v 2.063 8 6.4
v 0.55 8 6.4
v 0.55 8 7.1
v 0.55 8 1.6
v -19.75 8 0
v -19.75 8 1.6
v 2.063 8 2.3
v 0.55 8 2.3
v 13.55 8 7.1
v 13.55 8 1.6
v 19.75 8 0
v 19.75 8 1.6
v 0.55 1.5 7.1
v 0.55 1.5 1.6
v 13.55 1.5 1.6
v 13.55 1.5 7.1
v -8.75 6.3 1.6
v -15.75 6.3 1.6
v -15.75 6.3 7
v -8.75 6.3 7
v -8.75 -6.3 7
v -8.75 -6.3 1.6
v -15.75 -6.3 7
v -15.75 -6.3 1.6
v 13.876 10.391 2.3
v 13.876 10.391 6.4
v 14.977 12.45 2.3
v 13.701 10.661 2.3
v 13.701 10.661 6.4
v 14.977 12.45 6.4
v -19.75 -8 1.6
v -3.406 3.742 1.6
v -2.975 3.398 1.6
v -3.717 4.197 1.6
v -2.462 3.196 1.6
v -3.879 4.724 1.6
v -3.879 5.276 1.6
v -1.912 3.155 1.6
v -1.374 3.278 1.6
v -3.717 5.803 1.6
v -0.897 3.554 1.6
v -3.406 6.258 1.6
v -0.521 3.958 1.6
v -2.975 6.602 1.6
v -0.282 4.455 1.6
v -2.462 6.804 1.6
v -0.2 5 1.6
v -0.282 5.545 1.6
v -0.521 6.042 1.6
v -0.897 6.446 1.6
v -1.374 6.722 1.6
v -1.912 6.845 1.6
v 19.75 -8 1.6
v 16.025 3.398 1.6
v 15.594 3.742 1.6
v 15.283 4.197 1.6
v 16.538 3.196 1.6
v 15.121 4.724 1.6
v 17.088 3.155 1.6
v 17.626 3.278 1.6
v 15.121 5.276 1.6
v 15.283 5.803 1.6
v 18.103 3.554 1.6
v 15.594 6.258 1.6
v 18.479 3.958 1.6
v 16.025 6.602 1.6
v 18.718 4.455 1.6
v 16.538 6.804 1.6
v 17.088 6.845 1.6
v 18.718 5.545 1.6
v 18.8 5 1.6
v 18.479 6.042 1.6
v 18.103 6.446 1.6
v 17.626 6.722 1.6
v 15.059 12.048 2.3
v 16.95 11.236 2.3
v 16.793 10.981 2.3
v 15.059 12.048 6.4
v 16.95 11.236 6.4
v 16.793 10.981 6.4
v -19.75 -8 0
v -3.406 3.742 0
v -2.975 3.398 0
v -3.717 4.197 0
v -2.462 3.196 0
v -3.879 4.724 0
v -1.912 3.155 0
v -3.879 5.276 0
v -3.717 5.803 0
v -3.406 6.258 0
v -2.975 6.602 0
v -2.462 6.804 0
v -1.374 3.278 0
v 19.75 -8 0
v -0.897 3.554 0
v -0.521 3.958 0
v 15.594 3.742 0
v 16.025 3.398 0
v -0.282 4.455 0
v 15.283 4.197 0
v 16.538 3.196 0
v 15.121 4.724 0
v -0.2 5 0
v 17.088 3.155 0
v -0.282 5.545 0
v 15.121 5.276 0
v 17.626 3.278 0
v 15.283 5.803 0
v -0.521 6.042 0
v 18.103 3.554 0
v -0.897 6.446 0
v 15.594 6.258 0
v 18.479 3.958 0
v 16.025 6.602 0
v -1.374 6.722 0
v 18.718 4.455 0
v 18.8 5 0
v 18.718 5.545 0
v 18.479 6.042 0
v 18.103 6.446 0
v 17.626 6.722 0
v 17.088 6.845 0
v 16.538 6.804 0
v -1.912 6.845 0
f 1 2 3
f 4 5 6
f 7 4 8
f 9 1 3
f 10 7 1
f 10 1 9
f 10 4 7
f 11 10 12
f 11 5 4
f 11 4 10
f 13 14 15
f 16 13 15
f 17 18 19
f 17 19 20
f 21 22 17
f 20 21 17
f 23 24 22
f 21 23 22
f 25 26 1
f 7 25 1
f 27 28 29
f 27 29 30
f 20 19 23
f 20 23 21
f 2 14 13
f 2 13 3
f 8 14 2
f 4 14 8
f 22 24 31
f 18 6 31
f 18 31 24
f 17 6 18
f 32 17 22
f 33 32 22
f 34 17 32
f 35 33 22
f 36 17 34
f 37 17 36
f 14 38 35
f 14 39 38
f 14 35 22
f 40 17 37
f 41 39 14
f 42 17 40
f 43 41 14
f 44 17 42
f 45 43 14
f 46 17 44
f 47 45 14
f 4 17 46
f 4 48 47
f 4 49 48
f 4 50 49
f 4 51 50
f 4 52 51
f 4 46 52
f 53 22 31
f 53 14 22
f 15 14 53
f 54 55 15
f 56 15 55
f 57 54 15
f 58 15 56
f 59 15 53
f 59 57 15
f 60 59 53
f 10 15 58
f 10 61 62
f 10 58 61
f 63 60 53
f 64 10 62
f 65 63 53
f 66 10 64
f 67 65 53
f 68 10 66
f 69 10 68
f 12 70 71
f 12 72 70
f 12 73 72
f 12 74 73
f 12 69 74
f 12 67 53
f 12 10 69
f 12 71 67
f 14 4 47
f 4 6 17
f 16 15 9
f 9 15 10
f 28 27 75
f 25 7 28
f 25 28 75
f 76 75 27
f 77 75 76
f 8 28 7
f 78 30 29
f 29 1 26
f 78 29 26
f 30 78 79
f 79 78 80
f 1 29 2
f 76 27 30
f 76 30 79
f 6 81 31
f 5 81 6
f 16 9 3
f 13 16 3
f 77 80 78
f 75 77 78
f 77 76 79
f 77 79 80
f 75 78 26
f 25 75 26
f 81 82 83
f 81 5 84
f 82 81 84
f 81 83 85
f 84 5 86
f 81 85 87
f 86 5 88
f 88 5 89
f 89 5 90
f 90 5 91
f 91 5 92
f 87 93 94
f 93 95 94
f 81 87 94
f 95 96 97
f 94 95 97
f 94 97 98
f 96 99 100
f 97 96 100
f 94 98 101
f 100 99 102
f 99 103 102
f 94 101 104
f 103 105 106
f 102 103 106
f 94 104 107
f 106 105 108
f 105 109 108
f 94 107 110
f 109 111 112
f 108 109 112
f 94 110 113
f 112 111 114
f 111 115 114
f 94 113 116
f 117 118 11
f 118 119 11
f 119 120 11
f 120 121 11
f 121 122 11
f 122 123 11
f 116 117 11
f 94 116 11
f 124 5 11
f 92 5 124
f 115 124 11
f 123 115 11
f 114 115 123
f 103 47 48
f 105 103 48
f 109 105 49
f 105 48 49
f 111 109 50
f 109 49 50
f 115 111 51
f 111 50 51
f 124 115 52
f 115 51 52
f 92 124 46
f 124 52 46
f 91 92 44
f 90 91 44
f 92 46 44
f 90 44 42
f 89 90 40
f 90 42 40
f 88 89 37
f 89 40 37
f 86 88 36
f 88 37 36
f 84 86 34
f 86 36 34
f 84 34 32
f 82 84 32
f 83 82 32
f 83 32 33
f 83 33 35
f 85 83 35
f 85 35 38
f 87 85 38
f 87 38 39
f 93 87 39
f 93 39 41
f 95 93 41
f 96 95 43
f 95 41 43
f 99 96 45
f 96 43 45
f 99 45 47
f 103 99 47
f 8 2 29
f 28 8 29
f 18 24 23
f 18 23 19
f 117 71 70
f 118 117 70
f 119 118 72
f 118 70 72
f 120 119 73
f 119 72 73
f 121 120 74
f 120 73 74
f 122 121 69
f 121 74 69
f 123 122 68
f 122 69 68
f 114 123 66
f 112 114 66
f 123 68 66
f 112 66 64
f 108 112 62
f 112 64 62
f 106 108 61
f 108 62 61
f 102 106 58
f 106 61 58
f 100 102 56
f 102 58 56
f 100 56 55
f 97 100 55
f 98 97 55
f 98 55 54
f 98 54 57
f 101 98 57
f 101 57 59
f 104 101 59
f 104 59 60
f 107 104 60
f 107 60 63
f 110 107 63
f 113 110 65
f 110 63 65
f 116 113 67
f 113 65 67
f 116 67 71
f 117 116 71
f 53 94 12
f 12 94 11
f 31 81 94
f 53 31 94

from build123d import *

# Parameters (mm, degrees)
SKETCH1_W           = 39.5
SKETCH1_H           = 16
BOSS_EXTRUDE1_DEPTH = 1.6
SKETCH2_R           = 1.85
CUT_EXTRUDE1_DEPTH  = 1.6
SKETCH3_W           = 13
SKETCH3_H           = 6.5
BOSS_EXTRUDE2_DEPTH = 5.5
BOSS_EXTRUDE3_DEPTH = 5.5
SKETCH5_W           = 19.265102418
SKETCH5_H           = 0.7
CUT_EXTRUDE2_DEPTH  = 14.5
SKETCH6_W           = 7
SKETCH6_H           = 12.6
BOSS_EXTRUDE4_DEPTH = 5.4


with BuildPart() as part:
    # Sketch1 → Boss-Extrude1 (new body)
    with BuildSketch(Plane.XY):
        Rectangle(SKETCH1_W, SKETCH1_H)
    extrude(amount=BOSS_EXTRUDE1_DEPTH)

    # Sketch2 → Cut-Extrude1 (cut)
    with BuildSketch(Plane.XY.offset(1.6)):
        with Locations((16.95, 5)):
            Circle(SKETCH2_R)
        with Locations((-2.05, 5)):
            Circle(SKETCH2_R)
    extrude(amount=-CUT_EXTRUDE1_DEPTH, mode=Mode.SUBTRACT)

    # Sketch3 → Boss-Extrude2 (add)
    with BuildSketch(Plane.XY.offset(1.6)):
        with Locations((7.05, 4.75)):
            Rectangle(SKETCH3_W, SKETCH3_H)
    extrude(amount=BOSS_EXTRUDE2_DEPTH)

    # Sketch4 → Boss-Extrude3 (add)
    with BuildSketch(Plane.XY.offset(7.1)):
        Polygon((0.55, 8), (13.700517382, 10.661205252), (14.977364281, 12.45), (16.95, 11.236411926), (16.792802867, 10.980894683), (15.058778515, 12.047686313), (13.875966055, 10.390628824), (2.062519543, 8), align=None)
    extrude(amount=-BOSS_EXTRUDE3_DEPTH)

    # Sketch5 → Cut-Extrude2 (cut)
    with BuildSketch(Plane(origin=(0, 8, 0), x_dir=(1, 0, 0), z_dir=(0, 1, 0))):
        with Locations((10.182551209, -6.75)):
            Rectangle(SKETCH5_W, SKETCH5_H)
        with Locations((10.182551209, -1.95)):
            Rectangle(SKETCH5_W, SKETCH5_H)
    extrude(amount=CUT_EXTRUDE2_DEPTH, mode=Mode.SUBTRACT)

    # Sketch6 → Boss-Extrude4 (add)
    with BuildSketch(Plane.XY.offset(1.6)):
        with Locations((-12.25, 0)):
            Rectangle(SKETCH6_W, SKETCH6_H)
    extrude(amount=BOSS_EXTRUDE4_DEPTH)


solid = part.part
